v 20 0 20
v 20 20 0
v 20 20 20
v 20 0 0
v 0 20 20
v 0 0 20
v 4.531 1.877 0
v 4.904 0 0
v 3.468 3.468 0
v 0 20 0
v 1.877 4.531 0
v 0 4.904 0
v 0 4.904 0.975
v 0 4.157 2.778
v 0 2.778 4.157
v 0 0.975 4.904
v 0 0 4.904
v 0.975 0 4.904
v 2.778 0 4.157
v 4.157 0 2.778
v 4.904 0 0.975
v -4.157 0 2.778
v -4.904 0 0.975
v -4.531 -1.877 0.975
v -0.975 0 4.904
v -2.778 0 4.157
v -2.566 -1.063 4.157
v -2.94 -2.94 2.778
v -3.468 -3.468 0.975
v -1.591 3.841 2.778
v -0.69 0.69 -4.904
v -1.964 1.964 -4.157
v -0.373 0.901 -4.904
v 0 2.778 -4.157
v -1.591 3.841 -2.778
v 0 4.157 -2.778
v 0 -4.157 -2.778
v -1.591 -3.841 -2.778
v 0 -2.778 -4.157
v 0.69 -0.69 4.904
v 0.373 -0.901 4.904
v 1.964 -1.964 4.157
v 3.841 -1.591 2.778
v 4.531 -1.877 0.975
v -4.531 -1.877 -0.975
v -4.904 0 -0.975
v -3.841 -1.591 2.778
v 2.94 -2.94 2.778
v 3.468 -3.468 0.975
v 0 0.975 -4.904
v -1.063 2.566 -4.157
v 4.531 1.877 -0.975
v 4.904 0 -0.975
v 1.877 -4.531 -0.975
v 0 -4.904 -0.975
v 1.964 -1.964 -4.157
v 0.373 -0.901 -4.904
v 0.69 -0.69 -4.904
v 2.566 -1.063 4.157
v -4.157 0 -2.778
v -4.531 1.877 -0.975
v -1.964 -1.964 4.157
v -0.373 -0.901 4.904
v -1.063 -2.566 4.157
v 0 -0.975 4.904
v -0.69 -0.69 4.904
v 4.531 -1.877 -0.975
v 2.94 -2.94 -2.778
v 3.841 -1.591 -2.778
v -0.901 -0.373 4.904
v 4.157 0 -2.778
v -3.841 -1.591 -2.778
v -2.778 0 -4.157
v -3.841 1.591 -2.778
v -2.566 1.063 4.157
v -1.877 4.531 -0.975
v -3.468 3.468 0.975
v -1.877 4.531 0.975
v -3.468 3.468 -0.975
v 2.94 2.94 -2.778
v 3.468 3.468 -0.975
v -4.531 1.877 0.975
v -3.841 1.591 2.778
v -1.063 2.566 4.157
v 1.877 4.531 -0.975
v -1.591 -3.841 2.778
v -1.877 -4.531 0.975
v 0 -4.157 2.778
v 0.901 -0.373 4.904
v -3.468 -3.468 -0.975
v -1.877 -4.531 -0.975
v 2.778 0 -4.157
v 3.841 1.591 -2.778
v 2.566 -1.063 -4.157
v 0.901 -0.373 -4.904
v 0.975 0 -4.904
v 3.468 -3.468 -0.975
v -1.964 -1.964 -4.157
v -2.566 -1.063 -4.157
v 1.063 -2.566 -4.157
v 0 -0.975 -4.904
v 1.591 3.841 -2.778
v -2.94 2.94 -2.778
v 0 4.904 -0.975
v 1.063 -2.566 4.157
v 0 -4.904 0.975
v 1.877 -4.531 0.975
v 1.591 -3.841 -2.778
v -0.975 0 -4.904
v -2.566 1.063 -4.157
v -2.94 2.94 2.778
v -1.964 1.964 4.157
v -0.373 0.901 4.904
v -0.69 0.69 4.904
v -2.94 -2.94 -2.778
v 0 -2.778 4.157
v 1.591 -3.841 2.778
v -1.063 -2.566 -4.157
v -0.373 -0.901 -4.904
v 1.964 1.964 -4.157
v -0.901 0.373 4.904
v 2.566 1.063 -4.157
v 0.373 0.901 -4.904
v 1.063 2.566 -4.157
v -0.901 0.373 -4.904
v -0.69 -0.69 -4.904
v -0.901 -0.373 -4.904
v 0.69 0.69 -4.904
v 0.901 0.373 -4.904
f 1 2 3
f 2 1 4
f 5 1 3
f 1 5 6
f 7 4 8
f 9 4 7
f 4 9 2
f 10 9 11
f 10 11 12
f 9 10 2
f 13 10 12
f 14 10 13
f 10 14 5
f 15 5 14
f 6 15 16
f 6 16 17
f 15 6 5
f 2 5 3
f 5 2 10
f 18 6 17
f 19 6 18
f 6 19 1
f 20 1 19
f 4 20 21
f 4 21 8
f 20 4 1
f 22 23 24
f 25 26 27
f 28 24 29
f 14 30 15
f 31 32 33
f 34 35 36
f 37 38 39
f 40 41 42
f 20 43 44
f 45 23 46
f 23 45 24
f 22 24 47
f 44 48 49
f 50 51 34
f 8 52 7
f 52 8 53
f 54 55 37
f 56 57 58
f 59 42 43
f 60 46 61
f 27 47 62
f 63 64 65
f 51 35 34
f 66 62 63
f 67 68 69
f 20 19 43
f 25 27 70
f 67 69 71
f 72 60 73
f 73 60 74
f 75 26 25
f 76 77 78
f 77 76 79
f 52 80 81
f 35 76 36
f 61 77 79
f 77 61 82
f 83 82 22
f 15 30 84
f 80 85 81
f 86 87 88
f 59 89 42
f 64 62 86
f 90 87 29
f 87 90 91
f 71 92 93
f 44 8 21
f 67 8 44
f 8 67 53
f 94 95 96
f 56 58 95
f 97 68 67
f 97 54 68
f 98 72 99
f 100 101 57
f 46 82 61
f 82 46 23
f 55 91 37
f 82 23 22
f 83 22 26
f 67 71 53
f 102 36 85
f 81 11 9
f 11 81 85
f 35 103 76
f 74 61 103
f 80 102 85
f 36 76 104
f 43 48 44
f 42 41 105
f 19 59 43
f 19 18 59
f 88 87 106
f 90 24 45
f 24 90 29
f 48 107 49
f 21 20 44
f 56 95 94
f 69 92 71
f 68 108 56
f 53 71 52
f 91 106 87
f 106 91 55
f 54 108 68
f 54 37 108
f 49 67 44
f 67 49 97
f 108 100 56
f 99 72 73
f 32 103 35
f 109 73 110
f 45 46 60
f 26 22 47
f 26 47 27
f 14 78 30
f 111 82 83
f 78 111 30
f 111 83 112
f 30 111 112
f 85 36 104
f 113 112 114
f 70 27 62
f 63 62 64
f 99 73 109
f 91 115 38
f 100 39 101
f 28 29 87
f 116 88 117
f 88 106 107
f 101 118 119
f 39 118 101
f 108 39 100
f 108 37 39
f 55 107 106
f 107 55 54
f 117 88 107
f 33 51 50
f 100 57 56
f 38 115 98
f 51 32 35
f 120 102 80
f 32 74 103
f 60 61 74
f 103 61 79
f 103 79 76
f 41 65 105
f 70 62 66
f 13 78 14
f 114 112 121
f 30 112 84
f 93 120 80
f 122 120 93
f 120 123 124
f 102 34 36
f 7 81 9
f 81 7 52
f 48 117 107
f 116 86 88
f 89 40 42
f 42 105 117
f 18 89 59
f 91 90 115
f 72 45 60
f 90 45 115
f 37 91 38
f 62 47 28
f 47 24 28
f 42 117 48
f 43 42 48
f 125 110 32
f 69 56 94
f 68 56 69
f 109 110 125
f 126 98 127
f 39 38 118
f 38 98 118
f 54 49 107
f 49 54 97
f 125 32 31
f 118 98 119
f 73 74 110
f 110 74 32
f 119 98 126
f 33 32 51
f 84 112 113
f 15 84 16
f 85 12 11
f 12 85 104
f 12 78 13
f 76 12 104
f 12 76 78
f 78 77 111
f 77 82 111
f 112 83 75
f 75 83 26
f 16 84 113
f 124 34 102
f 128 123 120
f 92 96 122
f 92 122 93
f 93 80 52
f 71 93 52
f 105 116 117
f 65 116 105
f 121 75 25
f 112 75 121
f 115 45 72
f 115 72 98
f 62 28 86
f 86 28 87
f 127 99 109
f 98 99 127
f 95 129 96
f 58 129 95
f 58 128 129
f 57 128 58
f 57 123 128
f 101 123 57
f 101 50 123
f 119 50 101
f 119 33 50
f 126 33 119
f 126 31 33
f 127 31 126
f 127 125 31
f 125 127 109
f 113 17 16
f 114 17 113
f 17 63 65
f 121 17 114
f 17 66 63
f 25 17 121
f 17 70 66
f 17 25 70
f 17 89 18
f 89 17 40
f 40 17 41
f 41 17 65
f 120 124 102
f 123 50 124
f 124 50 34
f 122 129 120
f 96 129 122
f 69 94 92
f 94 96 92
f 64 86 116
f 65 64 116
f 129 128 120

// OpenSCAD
module box(size = 10) {
    cube(size);
}
wall = 2;
box(size = 20);
sphere(r = 5);
